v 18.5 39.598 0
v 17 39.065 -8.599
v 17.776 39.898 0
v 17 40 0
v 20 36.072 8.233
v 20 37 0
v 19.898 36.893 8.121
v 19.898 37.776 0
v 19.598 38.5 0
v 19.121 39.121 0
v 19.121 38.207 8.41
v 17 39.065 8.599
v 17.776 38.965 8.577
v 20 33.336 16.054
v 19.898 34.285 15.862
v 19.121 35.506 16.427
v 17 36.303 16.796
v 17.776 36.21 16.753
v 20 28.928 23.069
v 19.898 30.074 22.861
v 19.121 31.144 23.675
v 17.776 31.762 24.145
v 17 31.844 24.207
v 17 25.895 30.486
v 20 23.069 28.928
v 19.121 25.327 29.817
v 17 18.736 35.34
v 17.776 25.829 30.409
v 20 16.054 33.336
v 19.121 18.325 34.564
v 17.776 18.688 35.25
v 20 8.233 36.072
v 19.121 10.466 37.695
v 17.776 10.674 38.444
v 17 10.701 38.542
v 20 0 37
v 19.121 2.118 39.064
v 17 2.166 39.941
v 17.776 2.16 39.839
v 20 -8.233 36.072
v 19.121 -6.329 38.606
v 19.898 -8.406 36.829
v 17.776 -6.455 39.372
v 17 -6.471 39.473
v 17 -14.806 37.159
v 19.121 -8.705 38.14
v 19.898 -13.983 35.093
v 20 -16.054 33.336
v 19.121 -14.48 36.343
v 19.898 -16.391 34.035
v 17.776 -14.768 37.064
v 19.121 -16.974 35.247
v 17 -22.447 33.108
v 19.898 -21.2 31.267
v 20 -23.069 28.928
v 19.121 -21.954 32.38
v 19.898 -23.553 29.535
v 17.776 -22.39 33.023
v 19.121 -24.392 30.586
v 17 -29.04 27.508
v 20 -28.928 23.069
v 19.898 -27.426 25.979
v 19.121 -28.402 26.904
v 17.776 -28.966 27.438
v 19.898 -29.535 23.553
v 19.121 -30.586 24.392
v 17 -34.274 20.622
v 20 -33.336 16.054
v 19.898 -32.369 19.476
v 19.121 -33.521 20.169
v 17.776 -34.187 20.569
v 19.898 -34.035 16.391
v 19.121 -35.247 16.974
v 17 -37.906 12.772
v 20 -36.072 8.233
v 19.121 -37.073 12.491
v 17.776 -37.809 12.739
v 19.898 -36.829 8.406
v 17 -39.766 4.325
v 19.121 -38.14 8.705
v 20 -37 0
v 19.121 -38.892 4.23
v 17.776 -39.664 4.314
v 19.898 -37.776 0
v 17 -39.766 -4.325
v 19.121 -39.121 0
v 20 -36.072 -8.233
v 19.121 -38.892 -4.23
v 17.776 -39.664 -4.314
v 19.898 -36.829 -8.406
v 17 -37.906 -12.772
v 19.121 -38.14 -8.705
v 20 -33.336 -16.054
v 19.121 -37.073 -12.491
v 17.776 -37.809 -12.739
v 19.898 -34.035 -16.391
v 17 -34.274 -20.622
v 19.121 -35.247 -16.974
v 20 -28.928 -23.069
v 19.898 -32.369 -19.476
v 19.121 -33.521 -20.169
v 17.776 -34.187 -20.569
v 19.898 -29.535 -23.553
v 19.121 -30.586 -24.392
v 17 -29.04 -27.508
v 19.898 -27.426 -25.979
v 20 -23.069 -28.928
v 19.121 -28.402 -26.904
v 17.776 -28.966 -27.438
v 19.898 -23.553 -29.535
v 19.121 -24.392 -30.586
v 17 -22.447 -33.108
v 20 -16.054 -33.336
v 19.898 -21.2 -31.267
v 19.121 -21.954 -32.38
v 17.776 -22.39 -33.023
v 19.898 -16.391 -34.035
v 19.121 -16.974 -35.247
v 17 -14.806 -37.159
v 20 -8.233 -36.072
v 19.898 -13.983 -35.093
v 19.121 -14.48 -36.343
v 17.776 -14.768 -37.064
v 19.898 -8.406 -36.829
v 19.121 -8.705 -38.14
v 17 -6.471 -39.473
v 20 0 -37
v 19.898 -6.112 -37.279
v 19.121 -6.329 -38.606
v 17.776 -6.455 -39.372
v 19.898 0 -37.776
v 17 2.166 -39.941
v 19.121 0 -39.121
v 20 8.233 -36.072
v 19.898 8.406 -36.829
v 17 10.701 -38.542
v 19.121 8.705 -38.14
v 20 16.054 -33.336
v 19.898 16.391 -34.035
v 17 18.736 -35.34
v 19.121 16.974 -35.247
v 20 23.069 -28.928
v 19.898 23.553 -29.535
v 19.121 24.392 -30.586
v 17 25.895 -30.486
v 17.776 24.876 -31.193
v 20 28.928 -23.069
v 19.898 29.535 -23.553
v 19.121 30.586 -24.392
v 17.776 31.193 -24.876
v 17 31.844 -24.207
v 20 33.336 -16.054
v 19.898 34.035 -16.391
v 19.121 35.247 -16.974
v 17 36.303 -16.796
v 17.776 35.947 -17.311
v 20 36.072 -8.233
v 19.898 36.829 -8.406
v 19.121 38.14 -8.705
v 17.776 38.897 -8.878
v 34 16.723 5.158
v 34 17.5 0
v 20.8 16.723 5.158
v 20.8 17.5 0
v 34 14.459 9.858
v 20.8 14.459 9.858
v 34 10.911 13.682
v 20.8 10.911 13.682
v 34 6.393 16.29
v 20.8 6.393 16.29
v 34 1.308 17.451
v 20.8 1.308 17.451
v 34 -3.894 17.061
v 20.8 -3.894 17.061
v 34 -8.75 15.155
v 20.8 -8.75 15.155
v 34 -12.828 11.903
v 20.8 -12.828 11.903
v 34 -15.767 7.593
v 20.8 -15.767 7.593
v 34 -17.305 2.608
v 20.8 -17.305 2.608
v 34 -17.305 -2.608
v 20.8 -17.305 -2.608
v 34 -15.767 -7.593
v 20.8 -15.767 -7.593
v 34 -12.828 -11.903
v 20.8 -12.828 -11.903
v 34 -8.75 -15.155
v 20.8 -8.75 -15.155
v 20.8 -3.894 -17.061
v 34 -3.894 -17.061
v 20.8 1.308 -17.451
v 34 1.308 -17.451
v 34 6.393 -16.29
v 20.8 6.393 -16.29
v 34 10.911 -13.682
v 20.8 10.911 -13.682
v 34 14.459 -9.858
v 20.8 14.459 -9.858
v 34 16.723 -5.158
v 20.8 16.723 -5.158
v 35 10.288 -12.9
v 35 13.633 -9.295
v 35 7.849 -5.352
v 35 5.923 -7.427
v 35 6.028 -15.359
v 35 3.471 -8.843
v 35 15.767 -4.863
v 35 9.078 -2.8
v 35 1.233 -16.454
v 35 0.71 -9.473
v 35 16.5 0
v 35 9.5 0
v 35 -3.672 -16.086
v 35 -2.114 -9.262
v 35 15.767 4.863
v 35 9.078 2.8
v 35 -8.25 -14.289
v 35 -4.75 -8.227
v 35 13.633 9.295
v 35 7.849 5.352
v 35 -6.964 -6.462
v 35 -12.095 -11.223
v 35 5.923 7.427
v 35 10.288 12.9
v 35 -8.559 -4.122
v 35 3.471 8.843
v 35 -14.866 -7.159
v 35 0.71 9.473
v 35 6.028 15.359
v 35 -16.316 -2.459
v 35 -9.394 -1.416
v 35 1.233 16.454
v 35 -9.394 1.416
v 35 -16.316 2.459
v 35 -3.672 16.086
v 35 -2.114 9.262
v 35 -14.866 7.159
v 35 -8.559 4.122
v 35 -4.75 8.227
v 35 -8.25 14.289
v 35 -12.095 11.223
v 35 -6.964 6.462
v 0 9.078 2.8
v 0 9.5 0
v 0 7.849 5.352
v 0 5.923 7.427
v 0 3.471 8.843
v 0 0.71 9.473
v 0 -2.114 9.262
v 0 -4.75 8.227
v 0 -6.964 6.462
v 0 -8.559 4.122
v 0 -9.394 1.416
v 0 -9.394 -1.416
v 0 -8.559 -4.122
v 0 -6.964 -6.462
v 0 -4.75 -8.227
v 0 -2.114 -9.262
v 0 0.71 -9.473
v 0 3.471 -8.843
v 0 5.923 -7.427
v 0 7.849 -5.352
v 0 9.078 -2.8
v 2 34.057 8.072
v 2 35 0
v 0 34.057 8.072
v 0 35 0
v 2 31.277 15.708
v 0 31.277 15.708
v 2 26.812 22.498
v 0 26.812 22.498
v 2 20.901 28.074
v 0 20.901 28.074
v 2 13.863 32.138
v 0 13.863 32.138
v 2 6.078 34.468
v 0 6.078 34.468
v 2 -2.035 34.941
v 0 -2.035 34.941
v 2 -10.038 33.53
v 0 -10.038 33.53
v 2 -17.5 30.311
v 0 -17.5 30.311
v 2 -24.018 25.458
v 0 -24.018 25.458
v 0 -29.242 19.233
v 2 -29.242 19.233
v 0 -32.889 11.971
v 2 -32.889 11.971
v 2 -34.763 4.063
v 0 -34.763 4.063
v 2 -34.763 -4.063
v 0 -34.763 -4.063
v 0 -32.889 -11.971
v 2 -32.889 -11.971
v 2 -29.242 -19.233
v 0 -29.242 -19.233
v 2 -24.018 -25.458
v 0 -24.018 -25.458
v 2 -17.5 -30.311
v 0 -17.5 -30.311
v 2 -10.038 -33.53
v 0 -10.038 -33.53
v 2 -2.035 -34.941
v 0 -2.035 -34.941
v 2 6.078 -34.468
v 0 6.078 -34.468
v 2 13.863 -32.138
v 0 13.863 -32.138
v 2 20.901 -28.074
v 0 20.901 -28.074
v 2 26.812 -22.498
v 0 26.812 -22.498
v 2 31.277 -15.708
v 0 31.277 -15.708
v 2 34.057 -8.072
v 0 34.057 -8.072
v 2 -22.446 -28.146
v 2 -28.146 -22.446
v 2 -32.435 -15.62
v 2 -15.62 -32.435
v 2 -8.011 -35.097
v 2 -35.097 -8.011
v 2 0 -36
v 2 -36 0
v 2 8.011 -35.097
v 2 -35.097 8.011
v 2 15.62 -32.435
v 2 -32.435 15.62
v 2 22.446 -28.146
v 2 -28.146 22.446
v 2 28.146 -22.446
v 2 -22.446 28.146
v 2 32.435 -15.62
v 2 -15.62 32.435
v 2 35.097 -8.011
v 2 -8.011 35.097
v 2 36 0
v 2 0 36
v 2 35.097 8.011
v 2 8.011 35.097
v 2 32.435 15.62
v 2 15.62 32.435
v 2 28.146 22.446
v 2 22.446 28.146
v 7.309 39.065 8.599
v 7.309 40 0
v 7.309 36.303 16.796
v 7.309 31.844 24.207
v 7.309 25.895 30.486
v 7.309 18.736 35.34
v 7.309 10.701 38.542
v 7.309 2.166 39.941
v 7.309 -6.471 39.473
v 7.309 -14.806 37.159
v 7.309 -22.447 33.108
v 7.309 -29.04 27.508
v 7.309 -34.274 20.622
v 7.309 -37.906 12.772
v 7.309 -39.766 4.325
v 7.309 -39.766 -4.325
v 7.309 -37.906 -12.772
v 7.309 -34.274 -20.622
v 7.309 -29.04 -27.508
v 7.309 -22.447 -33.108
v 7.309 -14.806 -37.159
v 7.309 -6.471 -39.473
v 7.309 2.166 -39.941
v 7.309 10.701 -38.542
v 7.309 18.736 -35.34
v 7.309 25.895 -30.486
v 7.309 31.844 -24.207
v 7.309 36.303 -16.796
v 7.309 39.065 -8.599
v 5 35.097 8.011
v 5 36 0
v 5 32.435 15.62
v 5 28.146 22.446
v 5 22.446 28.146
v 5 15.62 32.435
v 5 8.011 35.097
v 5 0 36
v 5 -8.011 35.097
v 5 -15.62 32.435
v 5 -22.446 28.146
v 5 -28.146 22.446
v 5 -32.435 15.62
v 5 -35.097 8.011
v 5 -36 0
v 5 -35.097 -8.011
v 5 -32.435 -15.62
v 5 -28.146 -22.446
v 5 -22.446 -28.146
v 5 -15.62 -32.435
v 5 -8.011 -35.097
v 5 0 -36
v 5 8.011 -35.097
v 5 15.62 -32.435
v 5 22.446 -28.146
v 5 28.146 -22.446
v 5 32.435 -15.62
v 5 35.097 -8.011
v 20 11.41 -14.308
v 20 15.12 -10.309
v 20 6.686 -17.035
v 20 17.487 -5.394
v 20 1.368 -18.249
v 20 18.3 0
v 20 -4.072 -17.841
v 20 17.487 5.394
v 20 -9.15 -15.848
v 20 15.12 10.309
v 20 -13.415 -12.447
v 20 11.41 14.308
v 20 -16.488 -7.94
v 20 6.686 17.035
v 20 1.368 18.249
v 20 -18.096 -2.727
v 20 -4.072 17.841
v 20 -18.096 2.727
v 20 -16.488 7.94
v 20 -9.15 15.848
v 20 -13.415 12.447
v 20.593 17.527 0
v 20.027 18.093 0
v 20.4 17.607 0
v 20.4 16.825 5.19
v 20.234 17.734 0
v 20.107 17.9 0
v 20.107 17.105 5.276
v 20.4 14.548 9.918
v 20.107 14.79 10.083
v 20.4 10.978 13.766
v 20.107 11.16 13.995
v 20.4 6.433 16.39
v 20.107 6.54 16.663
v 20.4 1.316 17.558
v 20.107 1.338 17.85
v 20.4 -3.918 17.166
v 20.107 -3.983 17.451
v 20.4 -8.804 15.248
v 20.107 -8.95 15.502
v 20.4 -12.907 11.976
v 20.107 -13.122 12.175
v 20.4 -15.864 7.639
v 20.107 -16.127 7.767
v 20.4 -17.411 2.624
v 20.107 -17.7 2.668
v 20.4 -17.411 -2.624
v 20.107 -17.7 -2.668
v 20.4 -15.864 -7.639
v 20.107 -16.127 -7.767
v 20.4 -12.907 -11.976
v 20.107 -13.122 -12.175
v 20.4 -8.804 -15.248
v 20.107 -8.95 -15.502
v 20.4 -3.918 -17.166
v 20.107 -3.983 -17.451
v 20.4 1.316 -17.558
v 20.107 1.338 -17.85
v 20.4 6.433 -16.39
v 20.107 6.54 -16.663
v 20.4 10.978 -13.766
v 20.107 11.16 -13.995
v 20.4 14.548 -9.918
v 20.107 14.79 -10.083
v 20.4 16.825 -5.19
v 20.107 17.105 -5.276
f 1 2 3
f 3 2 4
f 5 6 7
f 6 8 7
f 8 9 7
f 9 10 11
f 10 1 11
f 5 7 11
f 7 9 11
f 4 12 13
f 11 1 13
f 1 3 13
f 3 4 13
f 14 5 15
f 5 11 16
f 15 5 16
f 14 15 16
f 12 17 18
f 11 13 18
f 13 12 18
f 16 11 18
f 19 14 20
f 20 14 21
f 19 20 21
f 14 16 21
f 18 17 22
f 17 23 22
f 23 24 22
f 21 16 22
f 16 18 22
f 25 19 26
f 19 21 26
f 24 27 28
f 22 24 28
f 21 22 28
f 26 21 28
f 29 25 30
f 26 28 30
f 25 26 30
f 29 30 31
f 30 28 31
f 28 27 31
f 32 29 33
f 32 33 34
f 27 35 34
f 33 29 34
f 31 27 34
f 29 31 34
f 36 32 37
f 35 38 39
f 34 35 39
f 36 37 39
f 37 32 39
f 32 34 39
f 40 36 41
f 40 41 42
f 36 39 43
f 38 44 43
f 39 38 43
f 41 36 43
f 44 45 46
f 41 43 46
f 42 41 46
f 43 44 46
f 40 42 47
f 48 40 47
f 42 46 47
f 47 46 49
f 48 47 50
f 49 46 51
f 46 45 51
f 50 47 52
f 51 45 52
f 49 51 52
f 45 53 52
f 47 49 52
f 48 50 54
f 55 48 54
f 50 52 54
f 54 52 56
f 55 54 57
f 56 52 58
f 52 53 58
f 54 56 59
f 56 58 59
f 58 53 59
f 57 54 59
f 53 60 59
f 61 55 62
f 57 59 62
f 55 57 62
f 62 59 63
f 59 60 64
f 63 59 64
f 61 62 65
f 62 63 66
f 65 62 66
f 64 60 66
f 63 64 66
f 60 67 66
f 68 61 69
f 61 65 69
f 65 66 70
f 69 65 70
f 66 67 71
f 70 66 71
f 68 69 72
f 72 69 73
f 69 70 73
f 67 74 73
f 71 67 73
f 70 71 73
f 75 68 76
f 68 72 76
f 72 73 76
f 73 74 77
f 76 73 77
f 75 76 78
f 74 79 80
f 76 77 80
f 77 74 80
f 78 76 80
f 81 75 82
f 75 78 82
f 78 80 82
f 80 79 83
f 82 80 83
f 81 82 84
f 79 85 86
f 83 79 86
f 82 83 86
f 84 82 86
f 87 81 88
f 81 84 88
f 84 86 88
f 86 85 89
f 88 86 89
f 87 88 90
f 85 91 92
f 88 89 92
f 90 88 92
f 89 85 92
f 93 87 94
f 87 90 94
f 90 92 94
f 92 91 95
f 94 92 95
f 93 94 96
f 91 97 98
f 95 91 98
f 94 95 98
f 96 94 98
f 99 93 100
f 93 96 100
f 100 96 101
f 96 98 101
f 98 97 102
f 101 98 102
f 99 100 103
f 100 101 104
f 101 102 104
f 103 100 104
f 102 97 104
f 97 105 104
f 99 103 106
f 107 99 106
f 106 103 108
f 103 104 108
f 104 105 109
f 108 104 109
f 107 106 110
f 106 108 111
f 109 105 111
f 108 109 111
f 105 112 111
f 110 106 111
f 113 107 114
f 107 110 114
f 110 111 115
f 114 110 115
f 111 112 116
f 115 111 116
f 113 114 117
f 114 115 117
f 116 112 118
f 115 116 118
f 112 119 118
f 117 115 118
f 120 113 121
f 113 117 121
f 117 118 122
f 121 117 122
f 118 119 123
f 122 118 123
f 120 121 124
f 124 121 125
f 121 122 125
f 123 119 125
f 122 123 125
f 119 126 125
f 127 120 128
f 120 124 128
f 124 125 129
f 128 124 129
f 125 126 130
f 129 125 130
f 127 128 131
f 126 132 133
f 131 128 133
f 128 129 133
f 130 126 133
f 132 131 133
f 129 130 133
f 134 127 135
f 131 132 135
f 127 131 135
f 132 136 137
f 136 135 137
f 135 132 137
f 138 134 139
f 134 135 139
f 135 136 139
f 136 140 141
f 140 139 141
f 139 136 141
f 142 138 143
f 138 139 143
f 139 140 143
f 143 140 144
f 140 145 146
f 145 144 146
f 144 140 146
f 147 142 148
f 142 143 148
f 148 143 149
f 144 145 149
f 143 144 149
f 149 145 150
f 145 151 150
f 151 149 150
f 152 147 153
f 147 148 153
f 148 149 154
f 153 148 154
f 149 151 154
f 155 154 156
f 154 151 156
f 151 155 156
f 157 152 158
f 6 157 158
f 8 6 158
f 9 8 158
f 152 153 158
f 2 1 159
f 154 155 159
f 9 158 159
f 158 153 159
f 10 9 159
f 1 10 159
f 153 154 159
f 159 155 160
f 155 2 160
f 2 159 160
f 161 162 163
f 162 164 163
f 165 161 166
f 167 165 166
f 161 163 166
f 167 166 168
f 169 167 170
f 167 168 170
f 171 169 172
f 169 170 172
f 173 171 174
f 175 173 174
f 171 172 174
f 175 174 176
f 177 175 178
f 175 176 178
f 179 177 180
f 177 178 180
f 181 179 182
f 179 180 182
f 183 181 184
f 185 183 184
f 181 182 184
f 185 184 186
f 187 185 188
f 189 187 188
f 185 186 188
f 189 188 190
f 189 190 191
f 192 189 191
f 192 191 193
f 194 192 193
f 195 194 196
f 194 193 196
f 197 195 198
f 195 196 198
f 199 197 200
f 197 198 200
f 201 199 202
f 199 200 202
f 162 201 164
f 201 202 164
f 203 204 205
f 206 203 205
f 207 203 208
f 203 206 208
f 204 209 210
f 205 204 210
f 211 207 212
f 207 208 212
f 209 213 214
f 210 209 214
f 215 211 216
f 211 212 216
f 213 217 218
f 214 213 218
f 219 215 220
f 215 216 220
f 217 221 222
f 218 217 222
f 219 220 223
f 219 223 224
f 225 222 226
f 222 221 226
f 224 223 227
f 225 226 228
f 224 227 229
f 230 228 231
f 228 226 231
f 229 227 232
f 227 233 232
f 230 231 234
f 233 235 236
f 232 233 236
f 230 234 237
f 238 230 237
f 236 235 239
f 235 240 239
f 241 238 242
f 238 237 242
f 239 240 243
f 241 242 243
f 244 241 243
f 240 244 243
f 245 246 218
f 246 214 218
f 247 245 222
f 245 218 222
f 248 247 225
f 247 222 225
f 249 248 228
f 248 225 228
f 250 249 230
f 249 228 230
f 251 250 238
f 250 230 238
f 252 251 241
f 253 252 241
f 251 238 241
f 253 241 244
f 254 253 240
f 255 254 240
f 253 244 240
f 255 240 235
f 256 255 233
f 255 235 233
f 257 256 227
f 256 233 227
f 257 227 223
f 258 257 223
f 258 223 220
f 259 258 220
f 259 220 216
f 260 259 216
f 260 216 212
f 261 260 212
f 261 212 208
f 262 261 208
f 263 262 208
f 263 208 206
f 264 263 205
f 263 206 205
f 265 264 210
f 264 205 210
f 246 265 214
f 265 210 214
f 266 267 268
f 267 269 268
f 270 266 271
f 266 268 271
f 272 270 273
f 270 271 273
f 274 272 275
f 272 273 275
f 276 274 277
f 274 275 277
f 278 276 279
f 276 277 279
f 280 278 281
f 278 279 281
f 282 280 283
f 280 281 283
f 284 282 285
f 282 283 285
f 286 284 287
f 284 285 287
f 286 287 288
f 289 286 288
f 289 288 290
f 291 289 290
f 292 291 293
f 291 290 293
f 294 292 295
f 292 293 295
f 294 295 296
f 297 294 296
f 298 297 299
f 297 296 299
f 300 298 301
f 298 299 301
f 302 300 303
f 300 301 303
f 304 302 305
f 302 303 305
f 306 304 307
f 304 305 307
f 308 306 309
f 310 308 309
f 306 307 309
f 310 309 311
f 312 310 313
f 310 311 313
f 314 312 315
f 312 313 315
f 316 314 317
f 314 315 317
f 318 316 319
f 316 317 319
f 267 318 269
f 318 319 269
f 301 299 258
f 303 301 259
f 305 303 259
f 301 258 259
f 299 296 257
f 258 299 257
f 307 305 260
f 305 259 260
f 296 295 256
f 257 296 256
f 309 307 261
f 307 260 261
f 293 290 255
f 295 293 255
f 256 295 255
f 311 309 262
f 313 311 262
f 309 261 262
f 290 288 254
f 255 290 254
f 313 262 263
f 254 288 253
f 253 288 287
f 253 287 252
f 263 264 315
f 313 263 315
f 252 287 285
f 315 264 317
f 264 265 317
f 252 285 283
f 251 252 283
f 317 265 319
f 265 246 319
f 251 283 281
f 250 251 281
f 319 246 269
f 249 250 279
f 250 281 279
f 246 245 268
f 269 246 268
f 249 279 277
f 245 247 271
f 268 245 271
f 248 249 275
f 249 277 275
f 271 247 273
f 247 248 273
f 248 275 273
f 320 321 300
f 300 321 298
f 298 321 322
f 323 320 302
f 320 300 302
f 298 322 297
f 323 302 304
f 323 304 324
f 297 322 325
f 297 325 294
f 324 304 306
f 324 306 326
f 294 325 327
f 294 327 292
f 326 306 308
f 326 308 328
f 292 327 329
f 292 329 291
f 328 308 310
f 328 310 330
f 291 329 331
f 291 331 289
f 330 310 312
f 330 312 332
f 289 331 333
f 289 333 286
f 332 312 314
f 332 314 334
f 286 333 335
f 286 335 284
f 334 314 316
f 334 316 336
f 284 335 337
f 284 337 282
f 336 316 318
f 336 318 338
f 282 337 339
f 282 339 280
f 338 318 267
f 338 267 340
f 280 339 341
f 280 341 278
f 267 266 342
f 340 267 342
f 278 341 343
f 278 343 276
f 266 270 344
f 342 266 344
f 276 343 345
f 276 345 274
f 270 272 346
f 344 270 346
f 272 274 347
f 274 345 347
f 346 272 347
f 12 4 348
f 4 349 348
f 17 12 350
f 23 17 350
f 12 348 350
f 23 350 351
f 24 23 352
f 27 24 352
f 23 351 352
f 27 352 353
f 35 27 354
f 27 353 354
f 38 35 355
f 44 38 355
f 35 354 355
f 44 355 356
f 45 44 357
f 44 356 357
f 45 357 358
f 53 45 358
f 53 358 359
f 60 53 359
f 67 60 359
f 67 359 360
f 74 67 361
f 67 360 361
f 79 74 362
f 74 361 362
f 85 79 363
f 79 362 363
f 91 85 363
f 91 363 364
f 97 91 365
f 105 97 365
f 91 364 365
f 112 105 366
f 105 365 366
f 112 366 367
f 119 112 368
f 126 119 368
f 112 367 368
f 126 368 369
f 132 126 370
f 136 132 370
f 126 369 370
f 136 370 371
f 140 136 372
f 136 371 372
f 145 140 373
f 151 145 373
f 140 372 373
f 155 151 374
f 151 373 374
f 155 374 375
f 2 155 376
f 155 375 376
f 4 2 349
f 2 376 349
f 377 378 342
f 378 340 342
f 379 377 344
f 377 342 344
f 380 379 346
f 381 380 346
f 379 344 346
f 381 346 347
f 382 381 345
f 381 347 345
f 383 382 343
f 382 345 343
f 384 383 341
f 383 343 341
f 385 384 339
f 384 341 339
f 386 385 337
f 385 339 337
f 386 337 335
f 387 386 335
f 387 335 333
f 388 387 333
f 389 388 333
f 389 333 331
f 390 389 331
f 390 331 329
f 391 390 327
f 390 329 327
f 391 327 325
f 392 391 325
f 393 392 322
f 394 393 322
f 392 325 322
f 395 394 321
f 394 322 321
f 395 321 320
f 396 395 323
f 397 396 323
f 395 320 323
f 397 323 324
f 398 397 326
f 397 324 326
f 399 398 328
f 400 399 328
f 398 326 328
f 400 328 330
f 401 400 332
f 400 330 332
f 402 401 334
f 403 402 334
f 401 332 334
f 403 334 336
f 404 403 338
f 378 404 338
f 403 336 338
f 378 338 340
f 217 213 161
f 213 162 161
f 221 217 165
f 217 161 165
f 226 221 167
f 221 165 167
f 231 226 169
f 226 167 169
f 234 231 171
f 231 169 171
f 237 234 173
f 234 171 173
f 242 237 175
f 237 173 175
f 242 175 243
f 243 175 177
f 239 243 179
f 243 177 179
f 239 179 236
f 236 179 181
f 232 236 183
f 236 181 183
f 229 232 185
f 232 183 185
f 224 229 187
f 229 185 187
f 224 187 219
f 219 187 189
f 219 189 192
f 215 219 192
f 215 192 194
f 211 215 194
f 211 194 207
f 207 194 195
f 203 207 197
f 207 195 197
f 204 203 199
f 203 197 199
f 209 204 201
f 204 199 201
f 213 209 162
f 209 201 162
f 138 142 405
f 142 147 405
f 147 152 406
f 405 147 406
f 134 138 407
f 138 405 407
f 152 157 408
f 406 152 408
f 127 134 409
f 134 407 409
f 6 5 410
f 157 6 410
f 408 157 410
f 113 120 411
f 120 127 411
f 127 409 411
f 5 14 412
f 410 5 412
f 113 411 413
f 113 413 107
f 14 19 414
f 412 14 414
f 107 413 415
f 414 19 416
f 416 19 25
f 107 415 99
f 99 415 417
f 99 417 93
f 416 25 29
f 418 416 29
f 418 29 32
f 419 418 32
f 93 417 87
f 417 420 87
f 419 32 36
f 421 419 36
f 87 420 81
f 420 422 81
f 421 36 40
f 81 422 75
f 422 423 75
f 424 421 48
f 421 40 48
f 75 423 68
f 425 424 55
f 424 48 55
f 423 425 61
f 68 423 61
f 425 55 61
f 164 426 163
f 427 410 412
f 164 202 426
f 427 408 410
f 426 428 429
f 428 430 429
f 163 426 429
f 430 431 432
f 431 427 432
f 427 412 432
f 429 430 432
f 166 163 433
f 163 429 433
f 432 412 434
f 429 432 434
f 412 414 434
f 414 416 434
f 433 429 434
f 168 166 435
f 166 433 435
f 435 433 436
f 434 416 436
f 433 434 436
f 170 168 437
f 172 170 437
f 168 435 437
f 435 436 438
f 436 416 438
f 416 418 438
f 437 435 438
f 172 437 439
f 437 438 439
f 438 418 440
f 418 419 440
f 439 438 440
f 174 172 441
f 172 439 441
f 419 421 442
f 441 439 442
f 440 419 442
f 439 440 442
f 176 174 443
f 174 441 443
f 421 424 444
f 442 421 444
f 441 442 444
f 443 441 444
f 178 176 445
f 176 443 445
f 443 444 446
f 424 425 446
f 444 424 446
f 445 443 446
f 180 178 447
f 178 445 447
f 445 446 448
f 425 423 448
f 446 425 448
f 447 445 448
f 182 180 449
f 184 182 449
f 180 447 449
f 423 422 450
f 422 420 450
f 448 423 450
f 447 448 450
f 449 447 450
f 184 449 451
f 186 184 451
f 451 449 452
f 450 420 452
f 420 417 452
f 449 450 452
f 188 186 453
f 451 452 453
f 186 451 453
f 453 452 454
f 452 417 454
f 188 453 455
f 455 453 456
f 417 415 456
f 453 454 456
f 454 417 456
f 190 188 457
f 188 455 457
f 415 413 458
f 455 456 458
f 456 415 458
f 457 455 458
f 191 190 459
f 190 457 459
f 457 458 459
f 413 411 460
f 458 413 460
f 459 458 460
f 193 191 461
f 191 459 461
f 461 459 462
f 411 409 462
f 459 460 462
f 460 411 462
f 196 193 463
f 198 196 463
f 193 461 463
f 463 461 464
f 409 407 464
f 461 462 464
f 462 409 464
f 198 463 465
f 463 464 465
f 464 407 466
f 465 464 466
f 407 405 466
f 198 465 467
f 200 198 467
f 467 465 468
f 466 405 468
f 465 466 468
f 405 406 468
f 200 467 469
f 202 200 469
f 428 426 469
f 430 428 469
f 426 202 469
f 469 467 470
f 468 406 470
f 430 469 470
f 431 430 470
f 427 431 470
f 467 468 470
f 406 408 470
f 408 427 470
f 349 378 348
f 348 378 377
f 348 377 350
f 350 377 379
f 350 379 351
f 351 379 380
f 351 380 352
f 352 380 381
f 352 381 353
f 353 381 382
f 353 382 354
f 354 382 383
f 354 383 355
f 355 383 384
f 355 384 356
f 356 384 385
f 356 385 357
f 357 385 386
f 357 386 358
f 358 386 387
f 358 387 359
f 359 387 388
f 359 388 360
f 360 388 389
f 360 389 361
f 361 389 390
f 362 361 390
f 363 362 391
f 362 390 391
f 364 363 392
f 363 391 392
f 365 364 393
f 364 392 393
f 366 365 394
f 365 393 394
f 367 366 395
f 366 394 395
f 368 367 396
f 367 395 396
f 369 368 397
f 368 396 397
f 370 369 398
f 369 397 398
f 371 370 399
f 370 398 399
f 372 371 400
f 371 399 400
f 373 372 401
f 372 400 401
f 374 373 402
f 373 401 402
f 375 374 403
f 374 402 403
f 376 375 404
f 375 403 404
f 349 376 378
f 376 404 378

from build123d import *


with BuildPart() as part:
    # Sketch1 → Base-Revolve (revolve)
    with BuildSketch(Plane.XY):
        with BuildLine():
            Line((0, 9.5), (35, 9.5))
            Line((35, 9.5), (35, 16.5))
            Line((35, 16.5), (34, 17.5))
            Line((34, 17.5), (20.8, 17.5))
            ThreePointArc((20.8, 17.5), (20.234314575, 17.734314575), (20, 18.3))
            Line((20, 18.3), (20, 37))
            ThreePointArc((20, 37), (19.121320344, 39.121320344), (17, 40))
            Line((17, 40), (7.309401077, 40))
            Line((7.309401077, 40), (5, 36))
            Line((5, 36), (2, 36))
            Line((2, 36), (2, 35))
            Line((2, 35), (0, 35))
            Line((0, 35), (0, 9.5))
        make_face()
    revolve(axis=Axis((-31.276903974, 0, 0), (1, 0, 0)))


solid = part.part
